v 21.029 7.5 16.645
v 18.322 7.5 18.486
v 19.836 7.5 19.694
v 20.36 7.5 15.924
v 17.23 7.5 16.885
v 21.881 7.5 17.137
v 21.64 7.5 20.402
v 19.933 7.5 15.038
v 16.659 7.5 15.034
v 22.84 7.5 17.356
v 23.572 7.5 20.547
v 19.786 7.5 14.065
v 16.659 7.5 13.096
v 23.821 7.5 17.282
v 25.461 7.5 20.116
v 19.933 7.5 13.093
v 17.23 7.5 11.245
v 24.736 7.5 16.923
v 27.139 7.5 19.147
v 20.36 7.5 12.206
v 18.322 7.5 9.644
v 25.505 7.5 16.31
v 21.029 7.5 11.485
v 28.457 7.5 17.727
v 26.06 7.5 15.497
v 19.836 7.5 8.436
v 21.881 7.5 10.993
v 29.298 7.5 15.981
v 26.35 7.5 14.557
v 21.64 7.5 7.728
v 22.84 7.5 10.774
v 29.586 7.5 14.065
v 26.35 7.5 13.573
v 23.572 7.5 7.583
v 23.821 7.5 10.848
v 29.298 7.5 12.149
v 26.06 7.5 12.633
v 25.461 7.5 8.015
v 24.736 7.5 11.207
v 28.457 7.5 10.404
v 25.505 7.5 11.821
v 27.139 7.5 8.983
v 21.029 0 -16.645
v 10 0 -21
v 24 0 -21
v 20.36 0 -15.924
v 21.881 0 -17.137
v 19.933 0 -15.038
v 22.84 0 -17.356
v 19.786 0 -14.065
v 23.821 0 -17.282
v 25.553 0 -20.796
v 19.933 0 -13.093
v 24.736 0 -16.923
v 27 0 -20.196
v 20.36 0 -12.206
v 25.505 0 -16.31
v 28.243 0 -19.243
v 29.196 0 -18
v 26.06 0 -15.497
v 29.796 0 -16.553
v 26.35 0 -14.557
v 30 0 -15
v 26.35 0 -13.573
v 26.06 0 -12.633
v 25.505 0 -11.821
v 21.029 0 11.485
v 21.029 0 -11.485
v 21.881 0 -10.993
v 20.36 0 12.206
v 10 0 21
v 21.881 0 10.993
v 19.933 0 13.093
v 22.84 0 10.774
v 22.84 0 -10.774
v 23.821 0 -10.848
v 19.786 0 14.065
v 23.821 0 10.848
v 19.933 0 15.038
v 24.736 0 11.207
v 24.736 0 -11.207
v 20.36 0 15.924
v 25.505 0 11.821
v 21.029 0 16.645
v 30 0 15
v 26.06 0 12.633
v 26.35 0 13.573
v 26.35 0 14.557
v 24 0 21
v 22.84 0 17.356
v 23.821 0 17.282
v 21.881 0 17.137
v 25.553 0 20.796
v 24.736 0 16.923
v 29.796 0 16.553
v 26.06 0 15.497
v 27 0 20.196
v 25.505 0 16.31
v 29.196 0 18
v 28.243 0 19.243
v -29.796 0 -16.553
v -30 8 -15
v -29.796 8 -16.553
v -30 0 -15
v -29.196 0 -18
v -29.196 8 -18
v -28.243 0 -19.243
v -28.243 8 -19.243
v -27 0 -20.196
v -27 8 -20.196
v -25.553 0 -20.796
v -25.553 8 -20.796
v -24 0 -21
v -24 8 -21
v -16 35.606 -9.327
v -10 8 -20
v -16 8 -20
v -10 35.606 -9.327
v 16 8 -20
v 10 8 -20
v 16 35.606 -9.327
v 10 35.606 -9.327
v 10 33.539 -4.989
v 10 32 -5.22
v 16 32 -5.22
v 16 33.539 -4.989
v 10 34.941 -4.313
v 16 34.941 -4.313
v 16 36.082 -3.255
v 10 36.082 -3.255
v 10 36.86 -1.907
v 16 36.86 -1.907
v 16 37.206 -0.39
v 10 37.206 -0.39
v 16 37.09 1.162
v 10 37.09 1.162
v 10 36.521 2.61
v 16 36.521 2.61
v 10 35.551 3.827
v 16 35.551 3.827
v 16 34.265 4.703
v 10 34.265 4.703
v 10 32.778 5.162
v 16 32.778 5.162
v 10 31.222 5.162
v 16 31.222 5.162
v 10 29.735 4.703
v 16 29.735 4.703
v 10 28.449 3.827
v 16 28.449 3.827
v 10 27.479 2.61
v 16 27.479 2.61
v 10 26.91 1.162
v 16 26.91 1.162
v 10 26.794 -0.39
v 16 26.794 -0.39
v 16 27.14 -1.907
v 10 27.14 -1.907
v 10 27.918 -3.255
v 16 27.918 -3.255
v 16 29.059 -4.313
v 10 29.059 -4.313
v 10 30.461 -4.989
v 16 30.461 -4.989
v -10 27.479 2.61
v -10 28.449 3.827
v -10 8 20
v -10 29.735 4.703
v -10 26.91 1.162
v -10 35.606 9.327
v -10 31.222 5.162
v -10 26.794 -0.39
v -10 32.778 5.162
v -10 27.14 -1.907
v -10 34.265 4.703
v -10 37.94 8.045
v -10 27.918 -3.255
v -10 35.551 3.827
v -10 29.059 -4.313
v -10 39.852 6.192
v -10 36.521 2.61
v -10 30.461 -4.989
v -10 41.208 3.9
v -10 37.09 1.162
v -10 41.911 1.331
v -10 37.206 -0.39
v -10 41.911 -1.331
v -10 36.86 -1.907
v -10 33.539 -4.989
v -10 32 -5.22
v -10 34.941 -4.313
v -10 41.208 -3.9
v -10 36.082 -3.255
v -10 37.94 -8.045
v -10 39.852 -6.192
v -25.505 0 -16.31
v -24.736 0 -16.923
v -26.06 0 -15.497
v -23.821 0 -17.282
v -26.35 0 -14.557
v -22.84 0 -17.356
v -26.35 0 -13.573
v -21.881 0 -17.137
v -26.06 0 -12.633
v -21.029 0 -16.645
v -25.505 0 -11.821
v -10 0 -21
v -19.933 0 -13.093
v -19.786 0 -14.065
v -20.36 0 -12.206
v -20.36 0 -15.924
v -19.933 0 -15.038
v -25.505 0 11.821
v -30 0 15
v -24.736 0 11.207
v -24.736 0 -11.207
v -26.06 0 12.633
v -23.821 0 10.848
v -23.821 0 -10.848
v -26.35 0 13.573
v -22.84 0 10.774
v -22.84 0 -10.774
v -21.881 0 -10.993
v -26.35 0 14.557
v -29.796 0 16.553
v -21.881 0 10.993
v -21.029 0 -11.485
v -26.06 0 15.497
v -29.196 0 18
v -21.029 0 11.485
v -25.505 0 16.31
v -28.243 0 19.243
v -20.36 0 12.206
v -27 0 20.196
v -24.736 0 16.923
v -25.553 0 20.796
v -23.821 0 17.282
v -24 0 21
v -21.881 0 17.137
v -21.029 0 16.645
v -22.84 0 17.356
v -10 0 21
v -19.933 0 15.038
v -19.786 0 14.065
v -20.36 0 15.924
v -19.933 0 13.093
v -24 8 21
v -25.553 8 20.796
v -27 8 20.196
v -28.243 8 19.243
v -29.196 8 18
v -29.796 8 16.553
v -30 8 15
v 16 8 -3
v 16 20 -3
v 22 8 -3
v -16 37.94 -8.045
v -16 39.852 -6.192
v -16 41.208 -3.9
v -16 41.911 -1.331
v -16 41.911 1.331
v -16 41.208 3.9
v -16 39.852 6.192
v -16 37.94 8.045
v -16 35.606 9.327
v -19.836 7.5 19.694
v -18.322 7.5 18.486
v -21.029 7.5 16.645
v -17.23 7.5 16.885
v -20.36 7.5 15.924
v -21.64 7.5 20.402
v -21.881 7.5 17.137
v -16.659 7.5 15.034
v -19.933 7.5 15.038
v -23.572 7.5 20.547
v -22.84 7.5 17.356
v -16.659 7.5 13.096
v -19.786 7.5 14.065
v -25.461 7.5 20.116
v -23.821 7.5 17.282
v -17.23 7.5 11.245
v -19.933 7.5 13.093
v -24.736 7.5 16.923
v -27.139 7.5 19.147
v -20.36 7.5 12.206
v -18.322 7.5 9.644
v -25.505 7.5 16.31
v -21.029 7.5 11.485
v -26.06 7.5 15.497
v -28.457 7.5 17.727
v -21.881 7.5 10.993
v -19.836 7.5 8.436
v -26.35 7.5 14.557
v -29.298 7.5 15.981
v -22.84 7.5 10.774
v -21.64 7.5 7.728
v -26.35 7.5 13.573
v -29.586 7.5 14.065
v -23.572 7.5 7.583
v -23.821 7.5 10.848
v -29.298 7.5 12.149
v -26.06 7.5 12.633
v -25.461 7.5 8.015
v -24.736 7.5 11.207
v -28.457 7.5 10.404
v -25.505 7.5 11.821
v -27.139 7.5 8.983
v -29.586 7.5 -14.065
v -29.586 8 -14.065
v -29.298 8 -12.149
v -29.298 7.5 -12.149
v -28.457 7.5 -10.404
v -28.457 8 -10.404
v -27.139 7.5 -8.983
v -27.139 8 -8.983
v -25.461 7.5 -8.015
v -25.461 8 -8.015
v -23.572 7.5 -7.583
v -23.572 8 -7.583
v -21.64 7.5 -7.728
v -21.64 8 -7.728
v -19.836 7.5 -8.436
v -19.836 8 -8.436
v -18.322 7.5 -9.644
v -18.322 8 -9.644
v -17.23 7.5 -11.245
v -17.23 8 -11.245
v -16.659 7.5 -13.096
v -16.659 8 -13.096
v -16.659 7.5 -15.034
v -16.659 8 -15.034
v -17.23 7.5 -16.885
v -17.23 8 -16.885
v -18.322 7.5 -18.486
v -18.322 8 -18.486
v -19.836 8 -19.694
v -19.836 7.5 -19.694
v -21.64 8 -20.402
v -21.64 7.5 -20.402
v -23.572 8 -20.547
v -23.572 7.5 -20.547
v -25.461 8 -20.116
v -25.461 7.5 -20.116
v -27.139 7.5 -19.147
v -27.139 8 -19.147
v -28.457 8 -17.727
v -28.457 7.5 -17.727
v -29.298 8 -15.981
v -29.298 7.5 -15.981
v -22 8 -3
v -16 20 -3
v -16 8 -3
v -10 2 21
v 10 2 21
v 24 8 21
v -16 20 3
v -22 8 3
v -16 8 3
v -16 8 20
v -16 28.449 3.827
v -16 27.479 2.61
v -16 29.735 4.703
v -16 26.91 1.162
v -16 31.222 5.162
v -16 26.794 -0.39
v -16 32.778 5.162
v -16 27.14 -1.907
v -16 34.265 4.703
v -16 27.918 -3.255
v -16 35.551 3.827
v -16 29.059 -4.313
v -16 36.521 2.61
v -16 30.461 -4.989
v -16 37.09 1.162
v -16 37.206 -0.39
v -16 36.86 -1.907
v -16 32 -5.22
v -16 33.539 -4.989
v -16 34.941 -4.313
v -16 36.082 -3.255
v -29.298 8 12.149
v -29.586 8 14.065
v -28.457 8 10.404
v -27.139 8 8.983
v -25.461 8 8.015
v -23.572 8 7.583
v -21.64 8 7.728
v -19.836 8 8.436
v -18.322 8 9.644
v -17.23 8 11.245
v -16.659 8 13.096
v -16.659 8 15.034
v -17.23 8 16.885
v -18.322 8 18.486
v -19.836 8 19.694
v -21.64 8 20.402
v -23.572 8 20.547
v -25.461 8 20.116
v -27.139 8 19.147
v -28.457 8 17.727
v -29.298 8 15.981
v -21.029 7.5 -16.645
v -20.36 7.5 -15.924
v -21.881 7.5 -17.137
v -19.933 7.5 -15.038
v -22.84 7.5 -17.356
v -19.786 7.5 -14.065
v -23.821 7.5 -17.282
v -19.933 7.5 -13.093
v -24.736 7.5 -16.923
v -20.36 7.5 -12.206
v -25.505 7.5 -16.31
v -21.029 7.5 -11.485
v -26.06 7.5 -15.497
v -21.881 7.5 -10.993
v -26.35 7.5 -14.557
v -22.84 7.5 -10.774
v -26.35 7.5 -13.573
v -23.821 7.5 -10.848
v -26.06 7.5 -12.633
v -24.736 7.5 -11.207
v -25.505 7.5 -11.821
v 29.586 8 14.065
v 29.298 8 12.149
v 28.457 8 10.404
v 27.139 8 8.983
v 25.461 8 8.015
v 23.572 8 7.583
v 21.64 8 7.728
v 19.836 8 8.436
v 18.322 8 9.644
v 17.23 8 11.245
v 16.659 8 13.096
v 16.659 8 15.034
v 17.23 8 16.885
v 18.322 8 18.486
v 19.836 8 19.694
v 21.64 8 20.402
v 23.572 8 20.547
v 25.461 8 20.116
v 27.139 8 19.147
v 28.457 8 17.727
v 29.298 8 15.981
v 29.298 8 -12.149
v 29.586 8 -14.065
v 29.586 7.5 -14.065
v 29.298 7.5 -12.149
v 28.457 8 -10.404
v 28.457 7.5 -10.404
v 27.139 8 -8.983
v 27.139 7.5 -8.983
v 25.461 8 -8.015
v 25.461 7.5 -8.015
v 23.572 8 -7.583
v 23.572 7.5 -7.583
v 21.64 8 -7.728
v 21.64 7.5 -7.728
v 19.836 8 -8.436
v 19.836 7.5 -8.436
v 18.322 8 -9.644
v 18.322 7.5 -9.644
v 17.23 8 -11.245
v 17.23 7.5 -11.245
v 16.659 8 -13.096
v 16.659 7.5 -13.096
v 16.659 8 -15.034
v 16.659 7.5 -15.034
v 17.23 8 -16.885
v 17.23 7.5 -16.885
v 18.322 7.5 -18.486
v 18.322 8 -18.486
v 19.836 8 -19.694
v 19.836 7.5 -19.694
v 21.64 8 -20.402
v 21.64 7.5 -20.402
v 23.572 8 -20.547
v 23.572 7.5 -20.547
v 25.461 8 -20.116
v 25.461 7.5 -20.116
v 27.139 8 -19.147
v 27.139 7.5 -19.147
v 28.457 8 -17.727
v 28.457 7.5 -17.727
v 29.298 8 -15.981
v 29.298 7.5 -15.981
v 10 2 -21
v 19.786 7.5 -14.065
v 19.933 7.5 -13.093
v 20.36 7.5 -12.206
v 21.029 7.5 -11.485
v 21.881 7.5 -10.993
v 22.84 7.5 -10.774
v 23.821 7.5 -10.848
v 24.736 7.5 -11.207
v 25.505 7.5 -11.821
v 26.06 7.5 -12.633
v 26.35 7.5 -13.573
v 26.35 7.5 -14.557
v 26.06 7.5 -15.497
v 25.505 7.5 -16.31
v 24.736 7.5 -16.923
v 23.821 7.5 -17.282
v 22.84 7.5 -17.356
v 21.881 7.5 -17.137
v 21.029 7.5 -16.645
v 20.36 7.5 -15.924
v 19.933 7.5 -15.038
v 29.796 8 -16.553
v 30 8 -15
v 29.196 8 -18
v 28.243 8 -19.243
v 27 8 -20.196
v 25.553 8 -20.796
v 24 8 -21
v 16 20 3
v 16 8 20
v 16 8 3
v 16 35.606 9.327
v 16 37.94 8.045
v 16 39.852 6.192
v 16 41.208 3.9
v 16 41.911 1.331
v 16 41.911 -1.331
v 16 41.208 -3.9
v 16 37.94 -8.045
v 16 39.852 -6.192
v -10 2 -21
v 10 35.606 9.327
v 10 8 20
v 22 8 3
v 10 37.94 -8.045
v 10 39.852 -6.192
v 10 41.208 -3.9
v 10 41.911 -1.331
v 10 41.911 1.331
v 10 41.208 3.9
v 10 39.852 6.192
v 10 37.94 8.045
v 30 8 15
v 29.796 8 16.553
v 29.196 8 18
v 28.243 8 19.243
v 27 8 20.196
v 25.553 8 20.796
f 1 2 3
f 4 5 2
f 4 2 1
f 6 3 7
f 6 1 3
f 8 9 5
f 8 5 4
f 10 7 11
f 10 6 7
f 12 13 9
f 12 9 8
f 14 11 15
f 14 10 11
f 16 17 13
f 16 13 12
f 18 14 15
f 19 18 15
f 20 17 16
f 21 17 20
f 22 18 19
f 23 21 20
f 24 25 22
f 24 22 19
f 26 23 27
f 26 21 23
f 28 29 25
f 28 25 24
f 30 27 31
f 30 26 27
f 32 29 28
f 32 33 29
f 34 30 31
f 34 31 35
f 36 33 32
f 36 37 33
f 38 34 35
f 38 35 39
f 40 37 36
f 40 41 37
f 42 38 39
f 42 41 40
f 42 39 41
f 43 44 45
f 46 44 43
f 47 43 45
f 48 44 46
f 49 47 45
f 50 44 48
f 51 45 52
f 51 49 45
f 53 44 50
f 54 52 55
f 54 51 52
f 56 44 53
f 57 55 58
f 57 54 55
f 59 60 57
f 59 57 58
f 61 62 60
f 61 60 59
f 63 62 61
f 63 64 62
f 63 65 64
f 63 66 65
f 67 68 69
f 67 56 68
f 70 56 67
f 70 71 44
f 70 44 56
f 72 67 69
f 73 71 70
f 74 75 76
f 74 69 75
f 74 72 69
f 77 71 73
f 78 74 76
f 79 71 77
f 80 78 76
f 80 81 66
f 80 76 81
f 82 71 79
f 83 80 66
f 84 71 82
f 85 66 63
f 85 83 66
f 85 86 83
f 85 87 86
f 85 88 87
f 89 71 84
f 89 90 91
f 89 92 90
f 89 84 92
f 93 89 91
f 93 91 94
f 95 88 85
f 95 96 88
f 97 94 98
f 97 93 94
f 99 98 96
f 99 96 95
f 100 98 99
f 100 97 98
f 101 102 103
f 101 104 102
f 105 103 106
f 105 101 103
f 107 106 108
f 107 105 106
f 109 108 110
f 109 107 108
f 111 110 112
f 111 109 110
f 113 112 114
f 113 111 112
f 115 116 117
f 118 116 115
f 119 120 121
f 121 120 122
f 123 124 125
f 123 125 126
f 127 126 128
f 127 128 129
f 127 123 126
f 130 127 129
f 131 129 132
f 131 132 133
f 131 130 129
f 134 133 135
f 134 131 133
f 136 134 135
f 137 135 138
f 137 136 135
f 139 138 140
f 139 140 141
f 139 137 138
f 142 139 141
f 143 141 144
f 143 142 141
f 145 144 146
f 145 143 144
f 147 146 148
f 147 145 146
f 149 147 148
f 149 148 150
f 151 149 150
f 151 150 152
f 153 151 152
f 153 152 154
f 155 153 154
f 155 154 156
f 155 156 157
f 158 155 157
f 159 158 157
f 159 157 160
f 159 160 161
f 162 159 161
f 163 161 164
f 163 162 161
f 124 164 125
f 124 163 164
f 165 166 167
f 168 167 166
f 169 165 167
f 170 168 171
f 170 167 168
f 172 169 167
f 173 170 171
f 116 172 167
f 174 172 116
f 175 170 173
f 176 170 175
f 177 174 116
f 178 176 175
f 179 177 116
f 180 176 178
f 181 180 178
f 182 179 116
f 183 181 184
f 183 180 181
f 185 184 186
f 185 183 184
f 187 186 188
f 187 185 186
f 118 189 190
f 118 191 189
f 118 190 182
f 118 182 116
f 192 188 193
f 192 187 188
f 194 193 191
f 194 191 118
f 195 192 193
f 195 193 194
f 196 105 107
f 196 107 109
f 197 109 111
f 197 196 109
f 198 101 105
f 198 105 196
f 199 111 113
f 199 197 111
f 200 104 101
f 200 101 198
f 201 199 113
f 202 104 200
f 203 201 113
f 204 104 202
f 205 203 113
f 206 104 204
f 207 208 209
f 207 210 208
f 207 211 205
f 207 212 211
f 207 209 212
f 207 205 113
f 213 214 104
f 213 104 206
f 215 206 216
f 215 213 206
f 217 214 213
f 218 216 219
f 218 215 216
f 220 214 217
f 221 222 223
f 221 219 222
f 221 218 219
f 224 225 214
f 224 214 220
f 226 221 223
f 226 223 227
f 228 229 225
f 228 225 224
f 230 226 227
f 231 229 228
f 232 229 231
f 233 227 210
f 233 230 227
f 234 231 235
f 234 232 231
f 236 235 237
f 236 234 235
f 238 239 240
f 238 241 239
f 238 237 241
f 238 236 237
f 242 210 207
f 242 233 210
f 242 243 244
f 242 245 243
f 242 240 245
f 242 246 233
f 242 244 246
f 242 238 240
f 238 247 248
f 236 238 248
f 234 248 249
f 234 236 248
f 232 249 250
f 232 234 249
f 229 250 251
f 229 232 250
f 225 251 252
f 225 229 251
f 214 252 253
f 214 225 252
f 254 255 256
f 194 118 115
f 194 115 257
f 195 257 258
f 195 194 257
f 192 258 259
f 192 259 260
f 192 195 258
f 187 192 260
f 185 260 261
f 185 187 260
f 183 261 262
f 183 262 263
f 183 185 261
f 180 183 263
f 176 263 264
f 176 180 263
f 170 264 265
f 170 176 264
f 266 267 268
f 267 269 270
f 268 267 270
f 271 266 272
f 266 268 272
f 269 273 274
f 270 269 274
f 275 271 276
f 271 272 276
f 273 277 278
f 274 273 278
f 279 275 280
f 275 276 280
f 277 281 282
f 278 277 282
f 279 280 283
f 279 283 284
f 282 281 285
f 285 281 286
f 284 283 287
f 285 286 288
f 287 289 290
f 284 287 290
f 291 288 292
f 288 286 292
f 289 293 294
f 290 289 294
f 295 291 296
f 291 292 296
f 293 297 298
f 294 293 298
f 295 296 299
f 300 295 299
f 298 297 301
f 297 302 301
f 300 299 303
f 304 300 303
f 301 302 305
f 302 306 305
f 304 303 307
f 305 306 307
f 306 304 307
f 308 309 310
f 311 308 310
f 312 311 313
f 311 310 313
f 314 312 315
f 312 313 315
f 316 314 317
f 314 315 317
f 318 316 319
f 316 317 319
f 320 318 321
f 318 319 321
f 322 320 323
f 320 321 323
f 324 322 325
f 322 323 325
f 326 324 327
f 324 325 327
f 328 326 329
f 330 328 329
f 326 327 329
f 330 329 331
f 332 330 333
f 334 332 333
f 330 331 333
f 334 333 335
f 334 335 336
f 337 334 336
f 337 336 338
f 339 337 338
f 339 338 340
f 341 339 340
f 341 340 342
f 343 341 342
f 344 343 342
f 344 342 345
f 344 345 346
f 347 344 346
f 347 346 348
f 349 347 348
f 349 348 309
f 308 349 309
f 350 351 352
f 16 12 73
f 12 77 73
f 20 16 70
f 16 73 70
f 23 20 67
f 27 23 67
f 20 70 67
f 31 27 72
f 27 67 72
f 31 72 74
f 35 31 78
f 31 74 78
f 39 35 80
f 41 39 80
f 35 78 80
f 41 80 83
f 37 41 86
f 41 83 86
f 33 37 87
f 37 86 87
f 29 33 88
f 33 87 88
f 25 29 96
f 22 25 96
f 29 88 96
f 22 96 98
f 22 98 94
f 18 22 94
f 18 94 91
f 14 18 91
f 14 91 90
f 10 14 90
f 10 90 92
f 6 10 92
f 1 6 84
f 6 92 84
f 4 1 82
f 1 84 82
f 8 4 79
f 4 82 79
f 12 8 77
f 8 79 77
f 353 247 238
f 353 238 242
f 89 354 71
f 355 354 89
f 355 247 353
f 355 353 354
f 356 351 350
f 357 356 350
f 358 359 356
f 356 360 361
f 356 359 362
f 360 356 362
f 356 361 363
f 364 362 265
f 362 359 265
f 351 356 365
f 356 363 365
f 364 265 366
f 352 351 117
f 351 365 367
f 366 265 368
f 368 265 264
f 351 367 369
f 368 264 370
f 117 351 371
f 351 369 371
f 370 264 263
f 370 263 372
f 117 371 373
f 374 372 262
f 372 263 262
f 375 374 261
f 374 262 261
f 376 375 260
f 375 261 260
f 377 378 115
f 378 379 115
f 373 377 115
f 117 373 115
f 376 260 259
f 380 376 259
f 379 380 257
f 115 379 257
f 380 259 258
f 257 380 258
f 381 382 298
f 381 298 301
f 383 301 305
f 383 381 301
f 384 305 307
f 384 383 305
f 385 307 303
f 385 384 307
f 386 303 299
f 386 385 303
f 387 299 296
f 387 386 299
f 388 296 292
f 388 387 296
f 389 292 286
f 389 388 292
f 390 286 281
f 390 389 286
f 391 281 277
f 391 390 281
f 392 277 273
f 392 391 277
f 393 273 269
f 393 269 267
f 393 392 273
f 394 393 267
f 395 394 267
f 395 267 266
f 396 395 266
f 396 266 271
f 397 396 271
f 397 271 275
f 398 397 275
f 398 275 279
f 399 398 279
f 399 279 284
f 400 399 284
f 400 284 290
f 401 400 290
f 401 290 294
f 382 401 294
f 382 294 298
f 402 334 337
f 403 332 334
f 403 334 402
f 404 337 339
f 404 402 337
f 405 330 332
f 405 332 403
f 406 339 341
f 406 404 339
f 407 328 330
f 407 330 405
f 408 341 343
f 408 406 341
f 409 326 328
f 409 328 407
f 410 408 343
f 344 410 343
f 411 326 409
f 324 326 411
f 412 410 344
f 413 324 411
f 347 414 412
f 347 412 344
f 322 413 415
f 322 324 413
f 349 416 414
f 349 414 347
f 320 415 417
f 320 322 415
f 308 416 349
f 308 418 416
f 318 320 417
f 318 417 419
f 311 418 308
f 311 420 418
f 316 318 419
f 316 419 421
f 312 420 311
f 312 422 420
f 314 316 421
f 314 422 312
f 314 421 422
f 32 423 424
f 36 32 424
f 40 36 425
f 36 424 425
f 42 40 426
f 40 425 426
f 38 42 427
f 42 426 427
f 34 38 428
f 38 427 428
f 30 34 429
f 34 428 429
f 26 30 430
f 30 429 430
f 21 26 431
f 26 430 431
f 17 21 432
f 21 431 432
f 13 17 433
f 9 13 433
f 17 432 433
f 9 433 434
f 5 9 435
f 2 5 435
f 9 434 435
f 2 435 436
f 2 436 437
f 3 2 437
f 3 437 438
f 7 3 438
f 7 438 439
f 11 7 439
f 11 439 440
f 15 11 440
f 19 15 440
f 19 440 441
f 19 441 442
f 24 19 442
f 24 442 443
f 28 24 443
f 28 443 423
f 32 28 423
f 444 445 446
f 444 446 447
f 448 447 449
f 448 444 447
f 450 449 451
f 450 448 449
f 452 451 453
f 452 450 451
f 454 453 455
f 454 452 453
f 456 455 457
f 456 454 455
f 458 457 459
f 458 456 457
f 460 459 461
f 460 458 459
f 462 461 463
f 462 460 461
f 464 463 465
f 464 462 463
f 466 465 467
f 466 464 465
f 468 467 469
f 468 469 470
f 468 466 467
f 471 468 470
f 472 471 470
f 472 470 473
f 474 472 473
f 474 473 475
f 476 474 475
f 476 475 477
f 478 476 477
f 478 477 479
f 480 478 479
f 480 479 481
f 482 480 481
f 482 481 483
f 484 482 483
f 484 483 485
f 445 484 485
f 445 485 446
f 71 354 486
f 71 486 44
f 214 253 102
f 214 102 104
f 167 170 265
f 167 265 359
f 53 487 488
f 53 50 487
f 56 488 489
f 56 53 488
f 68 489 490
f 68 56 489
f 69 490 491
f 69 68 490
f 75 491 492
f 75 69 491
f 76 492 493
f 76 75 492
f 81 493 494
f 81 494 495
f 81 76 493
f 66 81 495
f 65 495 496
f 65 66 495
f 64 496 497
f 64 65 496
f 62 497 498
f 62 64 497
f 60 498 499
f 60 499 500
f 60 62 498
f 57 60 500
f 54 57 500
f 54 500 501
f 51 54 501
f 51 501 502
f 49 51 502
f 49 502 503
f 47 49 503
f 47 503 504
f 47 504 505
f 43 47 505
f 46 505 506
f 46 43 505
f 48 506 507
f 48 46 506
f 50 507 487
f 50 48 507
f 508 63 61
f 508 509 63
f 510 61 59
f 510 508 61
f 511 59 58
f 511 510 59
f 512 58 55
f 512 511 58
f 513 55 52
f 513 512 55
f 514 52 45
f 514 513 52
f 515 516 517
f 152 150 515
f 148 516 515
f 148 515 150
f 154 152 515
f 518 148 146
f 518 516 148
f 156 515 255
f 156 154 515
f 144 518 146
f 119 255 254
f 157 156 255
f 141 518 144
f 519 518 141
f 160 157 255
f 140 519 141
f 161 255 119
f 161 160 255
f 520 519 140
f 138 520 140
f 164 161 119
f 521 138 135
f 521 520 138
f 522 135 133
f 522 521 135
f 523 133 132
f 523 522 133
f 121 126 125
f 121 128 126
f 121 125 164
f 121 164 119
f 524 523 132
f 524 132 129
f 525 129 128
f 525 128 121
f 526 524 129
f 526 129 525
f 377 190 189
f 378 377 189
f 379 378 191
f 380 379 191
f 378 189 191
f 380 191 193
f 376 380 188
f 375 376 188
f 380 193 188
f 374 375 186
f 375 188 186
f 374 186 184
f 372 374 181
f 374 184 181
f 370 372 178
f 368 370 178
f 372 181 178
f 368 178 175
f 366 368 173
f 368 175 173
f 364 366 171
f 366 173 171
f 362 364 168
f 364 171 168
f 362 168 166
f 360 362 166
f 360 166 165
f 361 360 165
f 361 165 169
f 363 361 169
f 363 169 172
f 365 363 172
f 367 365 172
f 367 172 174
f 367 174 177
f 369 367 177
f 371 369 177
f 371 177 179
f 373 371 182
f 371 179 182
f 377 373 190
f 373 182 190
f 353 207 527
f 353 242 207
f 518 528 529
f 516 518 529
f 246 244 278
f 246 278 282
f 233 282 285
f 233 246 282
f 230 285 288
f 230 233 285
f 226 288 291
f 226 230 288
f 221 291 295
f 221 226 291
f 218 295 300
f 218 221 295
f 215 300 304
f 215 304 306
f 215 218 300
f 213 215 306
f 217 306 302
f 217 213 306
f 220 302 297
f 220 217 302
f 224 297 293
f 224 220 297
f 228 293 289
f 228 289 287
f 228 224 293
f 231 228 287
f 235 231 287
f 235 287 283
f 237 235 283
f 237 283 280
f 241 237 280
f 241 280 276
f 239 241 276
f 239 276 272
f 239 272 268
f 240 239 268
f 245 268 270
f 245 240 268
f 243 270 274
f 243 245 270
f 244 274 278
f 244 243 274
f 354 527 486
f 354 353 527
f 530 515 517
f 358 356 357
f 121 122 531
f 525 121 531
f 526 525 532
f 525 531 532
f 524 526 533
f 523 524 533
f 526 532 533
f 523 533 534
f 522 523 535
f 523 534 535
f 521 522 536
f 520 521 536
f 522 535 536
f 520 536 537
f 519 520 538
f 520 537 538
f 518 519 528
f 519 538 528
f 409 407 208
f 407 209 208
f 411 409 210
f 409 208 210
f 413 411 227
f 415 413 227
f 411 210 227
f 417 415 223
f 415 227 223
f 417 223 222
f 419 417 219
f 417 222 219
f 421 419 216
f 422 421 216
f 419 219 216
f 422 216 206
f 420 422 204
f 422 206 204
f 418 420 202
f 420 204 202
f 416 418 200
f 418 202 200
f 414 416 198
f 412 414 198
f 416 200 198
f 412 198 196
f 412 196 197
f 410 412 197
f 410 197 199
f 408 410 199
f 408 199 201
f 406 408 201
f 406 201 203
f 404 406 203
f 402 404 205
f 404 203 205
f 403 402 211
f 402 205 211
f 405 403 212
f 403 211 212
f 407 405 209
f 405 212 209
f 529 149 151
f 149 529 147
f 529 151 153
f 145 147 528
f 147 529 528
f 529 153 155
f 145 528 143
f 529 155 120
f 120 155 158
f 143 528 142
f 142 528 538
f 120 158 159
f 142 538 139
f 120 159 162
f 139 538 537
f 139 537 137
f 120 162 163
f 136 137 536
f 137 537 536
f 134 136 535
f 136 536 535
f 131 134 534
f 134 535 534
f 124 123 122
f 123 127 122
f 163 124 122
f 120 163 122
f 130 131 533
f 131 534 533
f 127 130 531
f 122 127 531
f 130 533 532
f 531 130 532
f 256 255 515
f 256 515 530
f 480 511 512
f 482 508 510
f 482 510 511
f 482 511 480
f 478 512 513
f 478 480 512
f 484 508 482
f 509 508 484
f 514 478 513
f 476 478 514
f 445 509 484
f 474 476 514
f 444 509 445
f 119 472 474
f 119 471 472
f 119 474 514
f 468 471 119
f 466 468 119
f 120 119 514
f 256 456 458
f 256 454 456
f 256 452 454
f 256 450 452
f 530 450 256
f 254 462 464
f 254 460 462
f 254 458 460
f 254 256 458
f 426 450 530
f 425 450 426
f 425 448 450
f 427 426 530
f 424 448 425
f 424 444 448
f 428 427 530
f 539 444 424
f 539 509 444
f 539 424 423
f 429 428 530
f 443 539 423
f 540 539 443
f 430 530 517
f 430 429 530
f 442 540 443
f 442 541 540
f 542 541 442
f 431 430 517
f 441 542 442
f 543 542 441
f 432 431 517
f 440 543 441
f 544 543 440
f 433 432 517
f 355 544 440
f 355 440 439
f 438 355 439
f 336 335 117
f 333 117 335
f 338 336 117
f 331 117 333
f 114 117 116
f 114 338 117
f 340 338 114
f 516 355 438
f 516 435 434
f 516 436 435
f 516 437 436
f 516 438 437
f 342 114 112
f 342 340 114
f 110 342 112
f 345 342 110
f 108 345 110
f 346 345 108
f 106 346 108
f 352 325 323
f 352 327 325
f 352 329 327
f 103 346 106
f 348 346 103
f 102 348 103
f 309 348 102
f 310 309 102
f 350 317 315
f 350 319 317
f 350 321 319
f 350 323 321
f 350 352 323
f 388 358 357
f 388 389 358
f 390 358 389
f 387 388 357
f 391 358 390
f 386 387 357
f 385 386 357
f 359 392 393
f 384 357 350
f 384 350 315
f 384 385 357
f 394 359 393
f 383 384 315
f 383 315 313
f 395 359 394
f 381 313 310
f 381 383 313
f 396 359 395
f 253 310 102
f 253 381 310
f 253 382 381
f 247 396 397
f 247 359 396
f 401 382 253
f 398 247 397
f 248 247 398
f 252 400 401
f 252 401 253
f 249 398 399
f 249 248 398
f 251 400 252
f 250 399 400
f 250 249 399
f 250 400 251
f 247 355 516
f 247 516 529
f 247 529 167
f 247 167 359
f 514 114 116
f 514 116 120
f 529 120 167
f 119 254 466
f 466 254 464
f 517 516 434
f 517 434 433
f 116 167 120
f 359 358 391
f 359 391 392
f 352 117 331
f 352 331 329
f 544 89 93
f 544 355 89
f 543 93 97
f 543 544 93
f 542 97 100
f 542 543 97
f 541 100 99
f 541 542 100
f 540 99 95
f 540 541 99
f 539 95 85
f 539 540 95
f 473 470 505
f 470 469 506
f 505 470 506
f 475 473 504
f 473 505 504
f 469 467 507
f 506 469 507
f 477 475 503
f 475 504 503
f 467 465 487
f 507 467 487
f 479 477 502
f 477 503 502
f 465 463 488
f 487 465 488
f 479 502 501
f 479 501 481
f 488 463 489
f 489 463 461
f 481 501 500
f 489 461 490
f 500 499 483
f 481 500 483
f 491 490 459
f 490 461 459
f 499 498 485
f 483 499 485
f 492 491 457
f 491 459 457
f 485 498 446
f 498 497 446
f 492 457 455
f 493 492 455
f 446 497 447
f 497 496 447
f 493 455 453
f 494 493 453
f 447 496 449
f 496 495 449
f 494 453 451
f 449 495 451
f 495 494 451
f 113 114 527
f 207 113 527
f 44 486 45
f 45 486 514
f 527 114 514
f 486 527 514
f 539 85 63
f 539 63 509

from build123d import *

# Parameters (mm, degrees)
EXTRUDE_1_DEPTH             = 21
EXTRUDE_START               = 4
SKETCH_2_R                  = 5.220451321
EXTRUDE_3_DEPTH             = 6
RIB_1_REACH                 = 57.723
SKETCH_6_WALL_W             = 126.861461592
SKETCH_6_WALL_H             = 6
FILLET_1_R                  = 6
FILLET_2_R                  = 6
HOLE_WIZARD_C_3_D           = 6.6
HOLE_WIZARD_C_3_CBORE_D     = 13
HOLE_WIZARD_C_3_CBORE_DEPTH = 0.5
FILLET_3_R                  = 6
FILLET_4_R                  = 6
MIRROR_6_COPY_1_D           = 6.6
MIRROR_6_COPY_1_CBORE_D     = 13
MIRROR_6_COPY_1_CBORE_DEPTH = 0.5
MIRROR_6_COPY_2_D           = 6.6
MIRROR_6_COPY_2_CBORE_D     = 13
MIRROR_6_COPY_2_CBORE_DEPTH = 0.5


with BuildPart() as part:
    # 草图1 → 凸台-拉伸1 (new, symmetric)
    with BuildSketch(Plane.XY):
        Polygon((-10, 2), (10, 2), (10, 0), (30, 0), (30, 8), (-30, 8), (-30, 0), (-10, 0), align=None)
    extrude(amount=EXTRUDE_1_DEPTH, both=True)

    # 草图2 → 凸台-拉伸3 (add)
    with BuildSketch(Plane(origin=(6, 0, 0), x_dir=(0, 0, -1), z_dir=(1, 0, 0)).offset(EXTRUDE_START)):
        with BuildLine():
            Line((-20, 8), (20, 8))
            Line((20, 8), (9.327204223, 35.606003519))
            ThreePointArc((9.327204223, 35.606003519), (0, 42), (-9.327204223, 35.606003519))
            Line((-9.327204223, 35.606003519), (-20, 8))
        make_face()
        with Locations((0, 32)):
            Circle(SKETCH_2_R, mode=Mode.SUBTRACT)
    extrude_3 = extrude(amount=EXTRUDE_3_DEPTH)

    # 草图6 wall → 筋1 (add, up to next)
    with BuildSketch(Plane(origin=(19, 14, 0), x_dir=(0.4472135955, -0.894427191, 0), z_dir=(0.894427191, 0.4472135955, 0)), mode=Mode.PRIVATE) as rib_1_sk1:
        Rectangle(SKETCH_6_WALL_W, SKETCH_6_WALL_H)
    rib_1_tool1 = extrude(rib_1_sk1.sketch, amount=-RIB_1_REACH, mode=Mode.PRIVATE) - part.part
    rib_1 = rib_1_tool1.solids().sort_by_distance((19, 14, 0))[0]
    add(rib_1)

    # 圆角1
    fillet_1_edges = [part.edges().sort_by_distance(p)[0] for p in [
        (30, 4, 21),
    ]]
    fillet(fillet_1_edges, radius=FILLET_1_R)

    # 圆角2
    fillet_2_edges = [part.edges().sort_by_distance(p)[0] for p in [
        (30, 4, -21),
    ]]
    fillet(fillet_2_edges, radius=FILLET_2_R)

    # 打孔尺寸(%根据六角头螺)栓 C 级的类型3 (through all)
    with Locations(Plane(origin=(0, 8, 0), x_dir=(1, 0, 0), z_dir=(0, 1, 0))):
        with Locations((23.086377714, -14.06523012)):
            hole_wizard_c_3 = CounterBoreHole(HOLE_WIZARD_C_3_D / 2, HOLE_WIZARD_C_3_CBORE_D / 2, HOLE_WIZARD_C_3_CBORE_DEPTH)

    # 镜向1: 凸台-拉伸3, 筋1, 打孔尺寸(%根据六角头螺)栓 C 级的类型3 across plane
    add(extrude_3.mirror(Plane(origin=(0, 0, 0), x_dir=(0, 0, 1), z_dir=(1, 0, 0))))
    add(rib_1.mirror(Plane(origin=(0, 0, 0), x_dir=(0, 0, 1), z_dir=(1, 0, 0))))
    add(hole_wizard_c_3.mirror(Plane(origin=(0, 0, 0), x_dir=(0, 0, 1), z_dir=(1, 0, 0))), mode=Mode.SUBTRACT)

    # 圆角3
    fillet_3_edges = [part.edges().sort_by_distance(p)[0] for p in [
        (-30, 4, 21),
    ]]
    fillet(fillet_3_edges, radius=FILLET_3_R)

    # 圆角4
    fillet_4_edges = [part.edges().sort_by_distance(p)[0] for p in [
        (-30, 4, -21),
    ]]
    fillet(fillet_4_edges, radius=FILLET_4_R)

    # 镜向2: 打孔尺寸(%根据六角头螺)栓 C 级的类型3 across plane
    add(hole_wizard_c_3.mirror(Plane.XY), mode=Mode.SUBTRACT)

    # 镜向6 copy 1 (through all)
    with Locations(Plane(origin=(0, 8, 0), x_dir=(-1, 0, 0), z_dir=(0, 1, 0))):
        with Locations((23.086377714, -14.06523012)):
            CounterBoreHole(MIRROR_6_COPY_1_D / 2, MIRROR_6_COPY_1_CBORE_D / 2, MIRROR_6_COPY_1_CBORE_DEPTH)

    # 镜向6 copy 2 (through all)
    with Locations(Plane(origin=(0, 8, 0), x_dir=(-1, 0, 0), z_dir=(0, 1, 0))):
        with Locations((23.086377714, 14.06523012)):
            CounterBoreHole(MIRROR_6_COPY_2_D / 2, MIRROR_6_COPY_2_CBORE_D / 2, MIRROR_6_COPY_2_CBORE_DEPTH)


solid = part.part
